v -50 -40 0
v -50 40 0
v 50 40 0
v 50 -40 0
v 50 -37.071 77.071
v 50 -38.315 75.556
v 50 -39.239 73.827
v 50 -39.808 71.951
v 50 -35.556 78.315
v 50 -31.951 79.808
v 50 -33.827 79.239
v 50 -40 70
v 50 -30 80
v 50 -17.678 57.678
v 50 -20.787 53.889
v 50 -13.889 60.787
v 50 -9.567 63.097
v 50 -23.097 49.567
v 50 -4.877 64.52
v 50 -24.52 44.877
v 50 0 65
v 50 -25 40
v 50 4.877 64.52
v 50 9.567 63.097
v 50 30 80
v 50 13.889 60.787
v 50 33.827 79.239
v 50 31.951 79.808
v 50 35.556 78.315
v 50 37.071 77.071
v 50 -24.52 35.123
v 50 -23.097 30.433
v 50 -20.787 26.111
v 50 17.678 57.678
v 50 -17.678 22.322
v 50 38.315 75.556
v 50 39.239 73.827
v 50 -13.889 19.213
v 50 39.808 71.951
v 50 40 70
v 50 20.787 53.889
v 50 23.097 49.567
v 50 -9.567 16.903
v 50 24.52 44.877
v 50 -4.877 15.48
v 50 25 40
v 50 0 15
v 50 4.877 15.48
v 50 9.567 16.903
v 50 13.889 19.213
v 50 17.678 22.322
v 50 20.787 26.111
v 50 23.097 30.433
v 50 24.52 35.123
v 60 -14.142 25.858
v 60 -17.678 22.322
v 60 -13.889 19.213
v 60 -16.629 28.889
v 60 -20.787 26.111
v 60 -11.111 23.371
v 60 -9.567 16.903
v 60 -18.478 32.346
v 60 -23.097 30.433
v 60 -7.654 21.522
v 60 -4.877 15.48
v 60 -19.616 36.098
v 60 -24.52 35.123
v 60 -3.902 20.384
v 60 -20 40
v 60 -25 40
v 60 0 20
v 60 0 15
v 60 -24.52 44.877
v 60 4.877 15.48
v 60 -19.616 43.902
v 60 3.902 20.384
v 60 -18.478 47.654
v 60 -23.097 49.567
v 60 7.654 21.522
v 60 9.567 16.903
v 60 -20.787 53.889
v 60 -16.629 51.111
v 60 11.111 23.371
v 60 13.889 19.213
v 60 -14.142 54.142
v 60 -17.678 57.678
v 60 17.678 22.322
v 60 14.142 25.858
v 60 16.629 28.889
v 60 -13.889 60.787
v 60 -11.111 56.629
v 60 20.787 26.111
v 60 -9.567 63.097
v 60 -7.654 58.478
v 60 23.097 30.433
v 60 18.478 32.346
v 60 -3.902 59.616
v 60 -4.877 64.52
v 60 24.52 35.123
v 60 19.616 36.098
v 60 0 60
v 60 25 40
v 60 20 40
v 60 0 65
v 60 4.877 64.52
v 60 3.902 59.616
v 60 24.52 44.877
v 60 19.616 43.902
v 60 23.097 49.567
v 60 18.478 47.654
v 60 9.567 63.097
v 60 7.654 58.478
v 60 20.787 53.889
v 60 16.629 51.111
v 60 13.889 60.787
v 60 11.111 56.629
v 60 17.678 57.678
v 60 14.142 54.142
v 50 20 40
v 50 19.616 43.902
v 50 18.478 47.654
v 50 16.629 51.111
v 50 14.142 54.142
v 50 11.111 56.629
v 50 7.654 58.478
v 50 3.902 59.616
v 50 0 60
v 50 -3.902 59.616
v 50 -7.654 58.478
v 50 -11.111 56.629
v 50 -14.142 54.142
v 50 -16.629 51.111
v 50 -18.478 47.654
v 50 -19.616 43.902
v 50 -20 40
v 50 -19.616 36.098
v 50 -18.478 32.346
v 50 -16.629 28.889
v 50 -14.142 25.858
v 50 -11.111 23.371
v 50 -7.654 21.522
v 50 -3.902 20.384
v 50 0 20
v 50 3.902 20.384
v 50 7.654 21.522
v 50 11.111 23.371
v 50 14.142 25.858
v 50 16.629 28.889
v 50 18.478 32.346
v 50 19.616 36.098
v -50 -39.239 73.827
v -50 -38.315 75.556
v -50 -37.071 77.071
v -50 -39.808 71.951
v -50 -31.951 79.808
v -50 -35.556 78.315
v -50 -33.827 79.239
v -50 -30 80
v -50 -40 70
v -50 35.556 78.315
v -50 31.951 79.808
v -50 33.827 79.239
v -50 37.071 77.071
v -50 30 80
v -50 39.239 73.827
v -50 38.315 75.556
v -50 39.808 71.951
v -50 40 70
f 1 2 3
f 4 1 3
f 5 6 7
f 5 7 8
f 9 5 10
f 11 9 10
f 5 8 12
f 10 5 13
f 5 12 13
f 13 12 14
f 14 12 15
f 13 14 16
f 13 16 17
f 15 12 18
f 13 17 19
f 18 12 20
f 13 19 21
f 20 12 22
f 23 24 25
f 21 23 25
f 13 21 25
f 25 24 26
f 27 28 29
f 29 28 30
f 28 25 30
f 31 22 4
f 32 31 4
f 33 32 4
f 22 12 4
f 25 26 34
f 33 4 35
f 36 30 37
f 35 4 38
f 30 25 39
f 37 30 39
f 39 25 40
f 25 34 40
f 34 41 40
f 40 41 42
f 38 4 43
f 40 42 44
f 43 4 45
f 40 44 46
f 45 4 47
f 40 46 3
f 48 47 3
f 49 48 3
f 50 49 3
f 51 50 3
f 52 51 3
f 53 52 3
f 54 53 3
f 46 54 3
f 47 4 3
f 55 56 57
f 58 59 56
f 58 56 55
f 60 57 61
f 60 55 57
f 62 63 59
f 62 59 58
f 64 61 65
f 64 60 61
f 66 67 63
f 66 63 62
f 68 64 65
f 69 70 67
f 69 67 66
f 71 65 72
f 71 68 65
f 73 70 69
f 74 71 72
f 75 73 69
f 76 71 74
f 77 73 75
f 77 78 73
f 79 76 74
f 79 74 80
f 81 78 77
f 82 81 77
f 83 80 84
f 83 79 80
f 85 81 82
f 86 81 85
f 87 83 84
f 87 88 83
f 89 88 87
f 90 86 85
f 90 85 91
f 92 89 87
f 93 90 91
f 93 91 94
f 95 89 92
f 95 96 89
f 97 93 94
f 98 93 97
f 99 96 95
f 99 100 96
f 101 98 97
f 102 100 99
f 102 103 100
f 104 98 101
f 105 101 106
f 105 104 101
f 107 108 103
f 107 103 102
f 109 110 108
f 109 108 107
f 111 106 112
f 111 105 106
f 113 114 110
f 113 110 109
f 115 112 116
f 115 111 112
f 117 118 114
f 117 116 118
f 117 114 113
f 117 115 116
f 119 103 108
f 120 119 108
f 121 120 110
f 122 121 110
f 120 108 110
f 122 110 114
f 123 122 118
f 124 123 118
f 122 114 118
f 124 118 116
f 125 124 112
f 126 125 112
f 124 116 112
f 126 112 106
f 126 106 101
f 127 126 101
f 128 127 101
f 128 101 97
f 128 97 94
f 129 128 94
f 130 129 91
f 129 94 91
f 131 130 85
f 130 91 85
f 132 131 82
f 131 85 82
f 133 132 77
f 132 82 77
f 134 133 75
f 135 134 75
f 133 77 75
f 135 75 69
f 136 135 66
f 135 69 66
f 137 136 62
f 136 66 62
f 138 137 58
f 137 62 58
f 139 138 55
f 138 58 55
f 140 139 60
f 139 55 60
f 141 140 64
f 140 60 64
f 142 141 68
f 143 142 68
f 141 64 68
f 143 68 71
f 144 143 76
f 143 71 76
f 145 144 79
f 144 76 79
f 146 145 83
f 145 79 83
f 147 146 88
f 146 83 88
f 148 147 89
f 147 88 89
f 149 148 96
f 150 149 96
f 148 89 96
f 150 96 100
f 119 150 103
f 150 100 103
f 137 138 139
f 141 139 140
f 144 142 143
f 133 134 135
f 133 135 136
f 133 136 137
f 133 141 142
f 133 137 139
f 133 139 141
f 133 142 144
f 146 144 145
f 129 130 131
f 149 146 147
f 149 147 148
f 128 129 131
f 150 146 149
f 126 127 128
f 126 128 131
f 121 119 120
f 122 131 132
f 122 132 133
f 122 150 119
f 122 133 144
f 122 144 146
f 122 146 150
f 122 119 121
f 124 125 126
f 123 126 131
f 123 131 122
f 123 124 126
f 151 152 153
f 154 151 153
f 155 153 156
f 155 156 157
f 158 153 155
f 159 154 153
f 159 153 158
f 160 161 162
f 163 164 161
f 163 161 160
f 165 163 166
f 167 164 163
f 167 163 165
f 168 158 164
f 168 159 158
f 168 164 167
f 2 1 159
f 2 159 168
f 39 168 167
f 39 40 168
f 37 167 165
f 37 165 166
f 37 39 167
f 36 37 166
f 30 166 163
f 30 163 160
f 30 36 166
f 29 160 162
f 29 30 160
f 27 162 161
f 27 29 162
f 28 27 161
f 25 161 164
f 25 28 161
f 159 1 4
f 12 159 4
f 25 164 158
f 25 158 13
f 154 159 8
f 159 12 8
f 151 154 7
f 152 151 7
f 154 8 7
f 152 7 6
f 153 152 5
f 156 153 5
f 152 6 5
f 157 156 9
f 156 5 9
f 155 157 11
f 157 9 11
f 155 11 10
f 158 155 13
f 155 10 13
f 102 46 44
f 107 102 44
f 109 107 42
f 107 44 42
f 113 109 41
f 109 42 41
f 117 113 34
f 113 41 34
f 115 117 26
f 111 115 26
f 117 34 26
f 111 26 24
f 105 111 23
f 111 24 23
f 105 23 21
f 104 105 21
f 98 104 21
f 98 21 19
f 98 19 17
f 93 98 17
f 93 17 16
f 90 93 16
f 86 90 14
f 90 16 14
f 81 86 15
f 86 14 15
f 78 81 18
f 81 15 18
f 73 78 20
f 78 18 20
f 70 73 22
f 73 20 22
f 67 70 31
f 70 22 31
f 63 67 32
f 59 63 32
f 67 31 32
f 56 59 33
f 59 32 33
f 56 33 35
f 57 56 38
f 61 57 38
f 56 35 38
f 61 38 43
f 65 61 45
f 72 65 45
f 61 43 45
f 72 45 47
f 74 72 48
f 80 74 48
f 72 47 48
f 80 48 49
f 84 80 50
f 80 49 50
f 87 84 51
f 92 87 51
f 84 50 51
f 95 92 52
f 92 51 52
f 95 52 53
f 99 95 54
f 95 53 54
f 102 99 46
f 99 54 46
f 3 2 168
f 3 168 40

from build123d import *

# Parameters (mm, degrees)
F0_W     = 100
F0_H     = 80
F1_DEPTH = 80
F2_R     = 10
F3_R     = 25
F4_DEPTH = 10
F5_R     = 20
F6_DEPTH = 10


with BuildPart() as f1:
    # F0 (on Top) → F1 (new body)
    with BuildSketch(Plane.XY):
        Rectangle(F0_W, F0_H)
    extrude(amount=F1_DEPTH)

    # F2
    f2_edges = [f1.edges().sort_by_distance(p)[0] for p in [
        (0, -40, 80),
        (0, 40, 80),
    ]]
    fillet(f2_edges, radius=F2_R)

    # F3 (on face) → F4 (join)
    with BuildSketch(Plane.YZ.offset(50)):
        with Locations((0, 40)):
            Circle(F3_R)
    extrude(amount=F4_DEPTH)

    # F5 (on face) → F6 (cut)
    with BuildSketch(Plane.YZ.offset(60)):
        with Locations((0, 40)):
            Circle(F5_R)
    extrude(amount=-F6_DEPTH, mode=Mode.SUBTRACT)


solid = f1.part
